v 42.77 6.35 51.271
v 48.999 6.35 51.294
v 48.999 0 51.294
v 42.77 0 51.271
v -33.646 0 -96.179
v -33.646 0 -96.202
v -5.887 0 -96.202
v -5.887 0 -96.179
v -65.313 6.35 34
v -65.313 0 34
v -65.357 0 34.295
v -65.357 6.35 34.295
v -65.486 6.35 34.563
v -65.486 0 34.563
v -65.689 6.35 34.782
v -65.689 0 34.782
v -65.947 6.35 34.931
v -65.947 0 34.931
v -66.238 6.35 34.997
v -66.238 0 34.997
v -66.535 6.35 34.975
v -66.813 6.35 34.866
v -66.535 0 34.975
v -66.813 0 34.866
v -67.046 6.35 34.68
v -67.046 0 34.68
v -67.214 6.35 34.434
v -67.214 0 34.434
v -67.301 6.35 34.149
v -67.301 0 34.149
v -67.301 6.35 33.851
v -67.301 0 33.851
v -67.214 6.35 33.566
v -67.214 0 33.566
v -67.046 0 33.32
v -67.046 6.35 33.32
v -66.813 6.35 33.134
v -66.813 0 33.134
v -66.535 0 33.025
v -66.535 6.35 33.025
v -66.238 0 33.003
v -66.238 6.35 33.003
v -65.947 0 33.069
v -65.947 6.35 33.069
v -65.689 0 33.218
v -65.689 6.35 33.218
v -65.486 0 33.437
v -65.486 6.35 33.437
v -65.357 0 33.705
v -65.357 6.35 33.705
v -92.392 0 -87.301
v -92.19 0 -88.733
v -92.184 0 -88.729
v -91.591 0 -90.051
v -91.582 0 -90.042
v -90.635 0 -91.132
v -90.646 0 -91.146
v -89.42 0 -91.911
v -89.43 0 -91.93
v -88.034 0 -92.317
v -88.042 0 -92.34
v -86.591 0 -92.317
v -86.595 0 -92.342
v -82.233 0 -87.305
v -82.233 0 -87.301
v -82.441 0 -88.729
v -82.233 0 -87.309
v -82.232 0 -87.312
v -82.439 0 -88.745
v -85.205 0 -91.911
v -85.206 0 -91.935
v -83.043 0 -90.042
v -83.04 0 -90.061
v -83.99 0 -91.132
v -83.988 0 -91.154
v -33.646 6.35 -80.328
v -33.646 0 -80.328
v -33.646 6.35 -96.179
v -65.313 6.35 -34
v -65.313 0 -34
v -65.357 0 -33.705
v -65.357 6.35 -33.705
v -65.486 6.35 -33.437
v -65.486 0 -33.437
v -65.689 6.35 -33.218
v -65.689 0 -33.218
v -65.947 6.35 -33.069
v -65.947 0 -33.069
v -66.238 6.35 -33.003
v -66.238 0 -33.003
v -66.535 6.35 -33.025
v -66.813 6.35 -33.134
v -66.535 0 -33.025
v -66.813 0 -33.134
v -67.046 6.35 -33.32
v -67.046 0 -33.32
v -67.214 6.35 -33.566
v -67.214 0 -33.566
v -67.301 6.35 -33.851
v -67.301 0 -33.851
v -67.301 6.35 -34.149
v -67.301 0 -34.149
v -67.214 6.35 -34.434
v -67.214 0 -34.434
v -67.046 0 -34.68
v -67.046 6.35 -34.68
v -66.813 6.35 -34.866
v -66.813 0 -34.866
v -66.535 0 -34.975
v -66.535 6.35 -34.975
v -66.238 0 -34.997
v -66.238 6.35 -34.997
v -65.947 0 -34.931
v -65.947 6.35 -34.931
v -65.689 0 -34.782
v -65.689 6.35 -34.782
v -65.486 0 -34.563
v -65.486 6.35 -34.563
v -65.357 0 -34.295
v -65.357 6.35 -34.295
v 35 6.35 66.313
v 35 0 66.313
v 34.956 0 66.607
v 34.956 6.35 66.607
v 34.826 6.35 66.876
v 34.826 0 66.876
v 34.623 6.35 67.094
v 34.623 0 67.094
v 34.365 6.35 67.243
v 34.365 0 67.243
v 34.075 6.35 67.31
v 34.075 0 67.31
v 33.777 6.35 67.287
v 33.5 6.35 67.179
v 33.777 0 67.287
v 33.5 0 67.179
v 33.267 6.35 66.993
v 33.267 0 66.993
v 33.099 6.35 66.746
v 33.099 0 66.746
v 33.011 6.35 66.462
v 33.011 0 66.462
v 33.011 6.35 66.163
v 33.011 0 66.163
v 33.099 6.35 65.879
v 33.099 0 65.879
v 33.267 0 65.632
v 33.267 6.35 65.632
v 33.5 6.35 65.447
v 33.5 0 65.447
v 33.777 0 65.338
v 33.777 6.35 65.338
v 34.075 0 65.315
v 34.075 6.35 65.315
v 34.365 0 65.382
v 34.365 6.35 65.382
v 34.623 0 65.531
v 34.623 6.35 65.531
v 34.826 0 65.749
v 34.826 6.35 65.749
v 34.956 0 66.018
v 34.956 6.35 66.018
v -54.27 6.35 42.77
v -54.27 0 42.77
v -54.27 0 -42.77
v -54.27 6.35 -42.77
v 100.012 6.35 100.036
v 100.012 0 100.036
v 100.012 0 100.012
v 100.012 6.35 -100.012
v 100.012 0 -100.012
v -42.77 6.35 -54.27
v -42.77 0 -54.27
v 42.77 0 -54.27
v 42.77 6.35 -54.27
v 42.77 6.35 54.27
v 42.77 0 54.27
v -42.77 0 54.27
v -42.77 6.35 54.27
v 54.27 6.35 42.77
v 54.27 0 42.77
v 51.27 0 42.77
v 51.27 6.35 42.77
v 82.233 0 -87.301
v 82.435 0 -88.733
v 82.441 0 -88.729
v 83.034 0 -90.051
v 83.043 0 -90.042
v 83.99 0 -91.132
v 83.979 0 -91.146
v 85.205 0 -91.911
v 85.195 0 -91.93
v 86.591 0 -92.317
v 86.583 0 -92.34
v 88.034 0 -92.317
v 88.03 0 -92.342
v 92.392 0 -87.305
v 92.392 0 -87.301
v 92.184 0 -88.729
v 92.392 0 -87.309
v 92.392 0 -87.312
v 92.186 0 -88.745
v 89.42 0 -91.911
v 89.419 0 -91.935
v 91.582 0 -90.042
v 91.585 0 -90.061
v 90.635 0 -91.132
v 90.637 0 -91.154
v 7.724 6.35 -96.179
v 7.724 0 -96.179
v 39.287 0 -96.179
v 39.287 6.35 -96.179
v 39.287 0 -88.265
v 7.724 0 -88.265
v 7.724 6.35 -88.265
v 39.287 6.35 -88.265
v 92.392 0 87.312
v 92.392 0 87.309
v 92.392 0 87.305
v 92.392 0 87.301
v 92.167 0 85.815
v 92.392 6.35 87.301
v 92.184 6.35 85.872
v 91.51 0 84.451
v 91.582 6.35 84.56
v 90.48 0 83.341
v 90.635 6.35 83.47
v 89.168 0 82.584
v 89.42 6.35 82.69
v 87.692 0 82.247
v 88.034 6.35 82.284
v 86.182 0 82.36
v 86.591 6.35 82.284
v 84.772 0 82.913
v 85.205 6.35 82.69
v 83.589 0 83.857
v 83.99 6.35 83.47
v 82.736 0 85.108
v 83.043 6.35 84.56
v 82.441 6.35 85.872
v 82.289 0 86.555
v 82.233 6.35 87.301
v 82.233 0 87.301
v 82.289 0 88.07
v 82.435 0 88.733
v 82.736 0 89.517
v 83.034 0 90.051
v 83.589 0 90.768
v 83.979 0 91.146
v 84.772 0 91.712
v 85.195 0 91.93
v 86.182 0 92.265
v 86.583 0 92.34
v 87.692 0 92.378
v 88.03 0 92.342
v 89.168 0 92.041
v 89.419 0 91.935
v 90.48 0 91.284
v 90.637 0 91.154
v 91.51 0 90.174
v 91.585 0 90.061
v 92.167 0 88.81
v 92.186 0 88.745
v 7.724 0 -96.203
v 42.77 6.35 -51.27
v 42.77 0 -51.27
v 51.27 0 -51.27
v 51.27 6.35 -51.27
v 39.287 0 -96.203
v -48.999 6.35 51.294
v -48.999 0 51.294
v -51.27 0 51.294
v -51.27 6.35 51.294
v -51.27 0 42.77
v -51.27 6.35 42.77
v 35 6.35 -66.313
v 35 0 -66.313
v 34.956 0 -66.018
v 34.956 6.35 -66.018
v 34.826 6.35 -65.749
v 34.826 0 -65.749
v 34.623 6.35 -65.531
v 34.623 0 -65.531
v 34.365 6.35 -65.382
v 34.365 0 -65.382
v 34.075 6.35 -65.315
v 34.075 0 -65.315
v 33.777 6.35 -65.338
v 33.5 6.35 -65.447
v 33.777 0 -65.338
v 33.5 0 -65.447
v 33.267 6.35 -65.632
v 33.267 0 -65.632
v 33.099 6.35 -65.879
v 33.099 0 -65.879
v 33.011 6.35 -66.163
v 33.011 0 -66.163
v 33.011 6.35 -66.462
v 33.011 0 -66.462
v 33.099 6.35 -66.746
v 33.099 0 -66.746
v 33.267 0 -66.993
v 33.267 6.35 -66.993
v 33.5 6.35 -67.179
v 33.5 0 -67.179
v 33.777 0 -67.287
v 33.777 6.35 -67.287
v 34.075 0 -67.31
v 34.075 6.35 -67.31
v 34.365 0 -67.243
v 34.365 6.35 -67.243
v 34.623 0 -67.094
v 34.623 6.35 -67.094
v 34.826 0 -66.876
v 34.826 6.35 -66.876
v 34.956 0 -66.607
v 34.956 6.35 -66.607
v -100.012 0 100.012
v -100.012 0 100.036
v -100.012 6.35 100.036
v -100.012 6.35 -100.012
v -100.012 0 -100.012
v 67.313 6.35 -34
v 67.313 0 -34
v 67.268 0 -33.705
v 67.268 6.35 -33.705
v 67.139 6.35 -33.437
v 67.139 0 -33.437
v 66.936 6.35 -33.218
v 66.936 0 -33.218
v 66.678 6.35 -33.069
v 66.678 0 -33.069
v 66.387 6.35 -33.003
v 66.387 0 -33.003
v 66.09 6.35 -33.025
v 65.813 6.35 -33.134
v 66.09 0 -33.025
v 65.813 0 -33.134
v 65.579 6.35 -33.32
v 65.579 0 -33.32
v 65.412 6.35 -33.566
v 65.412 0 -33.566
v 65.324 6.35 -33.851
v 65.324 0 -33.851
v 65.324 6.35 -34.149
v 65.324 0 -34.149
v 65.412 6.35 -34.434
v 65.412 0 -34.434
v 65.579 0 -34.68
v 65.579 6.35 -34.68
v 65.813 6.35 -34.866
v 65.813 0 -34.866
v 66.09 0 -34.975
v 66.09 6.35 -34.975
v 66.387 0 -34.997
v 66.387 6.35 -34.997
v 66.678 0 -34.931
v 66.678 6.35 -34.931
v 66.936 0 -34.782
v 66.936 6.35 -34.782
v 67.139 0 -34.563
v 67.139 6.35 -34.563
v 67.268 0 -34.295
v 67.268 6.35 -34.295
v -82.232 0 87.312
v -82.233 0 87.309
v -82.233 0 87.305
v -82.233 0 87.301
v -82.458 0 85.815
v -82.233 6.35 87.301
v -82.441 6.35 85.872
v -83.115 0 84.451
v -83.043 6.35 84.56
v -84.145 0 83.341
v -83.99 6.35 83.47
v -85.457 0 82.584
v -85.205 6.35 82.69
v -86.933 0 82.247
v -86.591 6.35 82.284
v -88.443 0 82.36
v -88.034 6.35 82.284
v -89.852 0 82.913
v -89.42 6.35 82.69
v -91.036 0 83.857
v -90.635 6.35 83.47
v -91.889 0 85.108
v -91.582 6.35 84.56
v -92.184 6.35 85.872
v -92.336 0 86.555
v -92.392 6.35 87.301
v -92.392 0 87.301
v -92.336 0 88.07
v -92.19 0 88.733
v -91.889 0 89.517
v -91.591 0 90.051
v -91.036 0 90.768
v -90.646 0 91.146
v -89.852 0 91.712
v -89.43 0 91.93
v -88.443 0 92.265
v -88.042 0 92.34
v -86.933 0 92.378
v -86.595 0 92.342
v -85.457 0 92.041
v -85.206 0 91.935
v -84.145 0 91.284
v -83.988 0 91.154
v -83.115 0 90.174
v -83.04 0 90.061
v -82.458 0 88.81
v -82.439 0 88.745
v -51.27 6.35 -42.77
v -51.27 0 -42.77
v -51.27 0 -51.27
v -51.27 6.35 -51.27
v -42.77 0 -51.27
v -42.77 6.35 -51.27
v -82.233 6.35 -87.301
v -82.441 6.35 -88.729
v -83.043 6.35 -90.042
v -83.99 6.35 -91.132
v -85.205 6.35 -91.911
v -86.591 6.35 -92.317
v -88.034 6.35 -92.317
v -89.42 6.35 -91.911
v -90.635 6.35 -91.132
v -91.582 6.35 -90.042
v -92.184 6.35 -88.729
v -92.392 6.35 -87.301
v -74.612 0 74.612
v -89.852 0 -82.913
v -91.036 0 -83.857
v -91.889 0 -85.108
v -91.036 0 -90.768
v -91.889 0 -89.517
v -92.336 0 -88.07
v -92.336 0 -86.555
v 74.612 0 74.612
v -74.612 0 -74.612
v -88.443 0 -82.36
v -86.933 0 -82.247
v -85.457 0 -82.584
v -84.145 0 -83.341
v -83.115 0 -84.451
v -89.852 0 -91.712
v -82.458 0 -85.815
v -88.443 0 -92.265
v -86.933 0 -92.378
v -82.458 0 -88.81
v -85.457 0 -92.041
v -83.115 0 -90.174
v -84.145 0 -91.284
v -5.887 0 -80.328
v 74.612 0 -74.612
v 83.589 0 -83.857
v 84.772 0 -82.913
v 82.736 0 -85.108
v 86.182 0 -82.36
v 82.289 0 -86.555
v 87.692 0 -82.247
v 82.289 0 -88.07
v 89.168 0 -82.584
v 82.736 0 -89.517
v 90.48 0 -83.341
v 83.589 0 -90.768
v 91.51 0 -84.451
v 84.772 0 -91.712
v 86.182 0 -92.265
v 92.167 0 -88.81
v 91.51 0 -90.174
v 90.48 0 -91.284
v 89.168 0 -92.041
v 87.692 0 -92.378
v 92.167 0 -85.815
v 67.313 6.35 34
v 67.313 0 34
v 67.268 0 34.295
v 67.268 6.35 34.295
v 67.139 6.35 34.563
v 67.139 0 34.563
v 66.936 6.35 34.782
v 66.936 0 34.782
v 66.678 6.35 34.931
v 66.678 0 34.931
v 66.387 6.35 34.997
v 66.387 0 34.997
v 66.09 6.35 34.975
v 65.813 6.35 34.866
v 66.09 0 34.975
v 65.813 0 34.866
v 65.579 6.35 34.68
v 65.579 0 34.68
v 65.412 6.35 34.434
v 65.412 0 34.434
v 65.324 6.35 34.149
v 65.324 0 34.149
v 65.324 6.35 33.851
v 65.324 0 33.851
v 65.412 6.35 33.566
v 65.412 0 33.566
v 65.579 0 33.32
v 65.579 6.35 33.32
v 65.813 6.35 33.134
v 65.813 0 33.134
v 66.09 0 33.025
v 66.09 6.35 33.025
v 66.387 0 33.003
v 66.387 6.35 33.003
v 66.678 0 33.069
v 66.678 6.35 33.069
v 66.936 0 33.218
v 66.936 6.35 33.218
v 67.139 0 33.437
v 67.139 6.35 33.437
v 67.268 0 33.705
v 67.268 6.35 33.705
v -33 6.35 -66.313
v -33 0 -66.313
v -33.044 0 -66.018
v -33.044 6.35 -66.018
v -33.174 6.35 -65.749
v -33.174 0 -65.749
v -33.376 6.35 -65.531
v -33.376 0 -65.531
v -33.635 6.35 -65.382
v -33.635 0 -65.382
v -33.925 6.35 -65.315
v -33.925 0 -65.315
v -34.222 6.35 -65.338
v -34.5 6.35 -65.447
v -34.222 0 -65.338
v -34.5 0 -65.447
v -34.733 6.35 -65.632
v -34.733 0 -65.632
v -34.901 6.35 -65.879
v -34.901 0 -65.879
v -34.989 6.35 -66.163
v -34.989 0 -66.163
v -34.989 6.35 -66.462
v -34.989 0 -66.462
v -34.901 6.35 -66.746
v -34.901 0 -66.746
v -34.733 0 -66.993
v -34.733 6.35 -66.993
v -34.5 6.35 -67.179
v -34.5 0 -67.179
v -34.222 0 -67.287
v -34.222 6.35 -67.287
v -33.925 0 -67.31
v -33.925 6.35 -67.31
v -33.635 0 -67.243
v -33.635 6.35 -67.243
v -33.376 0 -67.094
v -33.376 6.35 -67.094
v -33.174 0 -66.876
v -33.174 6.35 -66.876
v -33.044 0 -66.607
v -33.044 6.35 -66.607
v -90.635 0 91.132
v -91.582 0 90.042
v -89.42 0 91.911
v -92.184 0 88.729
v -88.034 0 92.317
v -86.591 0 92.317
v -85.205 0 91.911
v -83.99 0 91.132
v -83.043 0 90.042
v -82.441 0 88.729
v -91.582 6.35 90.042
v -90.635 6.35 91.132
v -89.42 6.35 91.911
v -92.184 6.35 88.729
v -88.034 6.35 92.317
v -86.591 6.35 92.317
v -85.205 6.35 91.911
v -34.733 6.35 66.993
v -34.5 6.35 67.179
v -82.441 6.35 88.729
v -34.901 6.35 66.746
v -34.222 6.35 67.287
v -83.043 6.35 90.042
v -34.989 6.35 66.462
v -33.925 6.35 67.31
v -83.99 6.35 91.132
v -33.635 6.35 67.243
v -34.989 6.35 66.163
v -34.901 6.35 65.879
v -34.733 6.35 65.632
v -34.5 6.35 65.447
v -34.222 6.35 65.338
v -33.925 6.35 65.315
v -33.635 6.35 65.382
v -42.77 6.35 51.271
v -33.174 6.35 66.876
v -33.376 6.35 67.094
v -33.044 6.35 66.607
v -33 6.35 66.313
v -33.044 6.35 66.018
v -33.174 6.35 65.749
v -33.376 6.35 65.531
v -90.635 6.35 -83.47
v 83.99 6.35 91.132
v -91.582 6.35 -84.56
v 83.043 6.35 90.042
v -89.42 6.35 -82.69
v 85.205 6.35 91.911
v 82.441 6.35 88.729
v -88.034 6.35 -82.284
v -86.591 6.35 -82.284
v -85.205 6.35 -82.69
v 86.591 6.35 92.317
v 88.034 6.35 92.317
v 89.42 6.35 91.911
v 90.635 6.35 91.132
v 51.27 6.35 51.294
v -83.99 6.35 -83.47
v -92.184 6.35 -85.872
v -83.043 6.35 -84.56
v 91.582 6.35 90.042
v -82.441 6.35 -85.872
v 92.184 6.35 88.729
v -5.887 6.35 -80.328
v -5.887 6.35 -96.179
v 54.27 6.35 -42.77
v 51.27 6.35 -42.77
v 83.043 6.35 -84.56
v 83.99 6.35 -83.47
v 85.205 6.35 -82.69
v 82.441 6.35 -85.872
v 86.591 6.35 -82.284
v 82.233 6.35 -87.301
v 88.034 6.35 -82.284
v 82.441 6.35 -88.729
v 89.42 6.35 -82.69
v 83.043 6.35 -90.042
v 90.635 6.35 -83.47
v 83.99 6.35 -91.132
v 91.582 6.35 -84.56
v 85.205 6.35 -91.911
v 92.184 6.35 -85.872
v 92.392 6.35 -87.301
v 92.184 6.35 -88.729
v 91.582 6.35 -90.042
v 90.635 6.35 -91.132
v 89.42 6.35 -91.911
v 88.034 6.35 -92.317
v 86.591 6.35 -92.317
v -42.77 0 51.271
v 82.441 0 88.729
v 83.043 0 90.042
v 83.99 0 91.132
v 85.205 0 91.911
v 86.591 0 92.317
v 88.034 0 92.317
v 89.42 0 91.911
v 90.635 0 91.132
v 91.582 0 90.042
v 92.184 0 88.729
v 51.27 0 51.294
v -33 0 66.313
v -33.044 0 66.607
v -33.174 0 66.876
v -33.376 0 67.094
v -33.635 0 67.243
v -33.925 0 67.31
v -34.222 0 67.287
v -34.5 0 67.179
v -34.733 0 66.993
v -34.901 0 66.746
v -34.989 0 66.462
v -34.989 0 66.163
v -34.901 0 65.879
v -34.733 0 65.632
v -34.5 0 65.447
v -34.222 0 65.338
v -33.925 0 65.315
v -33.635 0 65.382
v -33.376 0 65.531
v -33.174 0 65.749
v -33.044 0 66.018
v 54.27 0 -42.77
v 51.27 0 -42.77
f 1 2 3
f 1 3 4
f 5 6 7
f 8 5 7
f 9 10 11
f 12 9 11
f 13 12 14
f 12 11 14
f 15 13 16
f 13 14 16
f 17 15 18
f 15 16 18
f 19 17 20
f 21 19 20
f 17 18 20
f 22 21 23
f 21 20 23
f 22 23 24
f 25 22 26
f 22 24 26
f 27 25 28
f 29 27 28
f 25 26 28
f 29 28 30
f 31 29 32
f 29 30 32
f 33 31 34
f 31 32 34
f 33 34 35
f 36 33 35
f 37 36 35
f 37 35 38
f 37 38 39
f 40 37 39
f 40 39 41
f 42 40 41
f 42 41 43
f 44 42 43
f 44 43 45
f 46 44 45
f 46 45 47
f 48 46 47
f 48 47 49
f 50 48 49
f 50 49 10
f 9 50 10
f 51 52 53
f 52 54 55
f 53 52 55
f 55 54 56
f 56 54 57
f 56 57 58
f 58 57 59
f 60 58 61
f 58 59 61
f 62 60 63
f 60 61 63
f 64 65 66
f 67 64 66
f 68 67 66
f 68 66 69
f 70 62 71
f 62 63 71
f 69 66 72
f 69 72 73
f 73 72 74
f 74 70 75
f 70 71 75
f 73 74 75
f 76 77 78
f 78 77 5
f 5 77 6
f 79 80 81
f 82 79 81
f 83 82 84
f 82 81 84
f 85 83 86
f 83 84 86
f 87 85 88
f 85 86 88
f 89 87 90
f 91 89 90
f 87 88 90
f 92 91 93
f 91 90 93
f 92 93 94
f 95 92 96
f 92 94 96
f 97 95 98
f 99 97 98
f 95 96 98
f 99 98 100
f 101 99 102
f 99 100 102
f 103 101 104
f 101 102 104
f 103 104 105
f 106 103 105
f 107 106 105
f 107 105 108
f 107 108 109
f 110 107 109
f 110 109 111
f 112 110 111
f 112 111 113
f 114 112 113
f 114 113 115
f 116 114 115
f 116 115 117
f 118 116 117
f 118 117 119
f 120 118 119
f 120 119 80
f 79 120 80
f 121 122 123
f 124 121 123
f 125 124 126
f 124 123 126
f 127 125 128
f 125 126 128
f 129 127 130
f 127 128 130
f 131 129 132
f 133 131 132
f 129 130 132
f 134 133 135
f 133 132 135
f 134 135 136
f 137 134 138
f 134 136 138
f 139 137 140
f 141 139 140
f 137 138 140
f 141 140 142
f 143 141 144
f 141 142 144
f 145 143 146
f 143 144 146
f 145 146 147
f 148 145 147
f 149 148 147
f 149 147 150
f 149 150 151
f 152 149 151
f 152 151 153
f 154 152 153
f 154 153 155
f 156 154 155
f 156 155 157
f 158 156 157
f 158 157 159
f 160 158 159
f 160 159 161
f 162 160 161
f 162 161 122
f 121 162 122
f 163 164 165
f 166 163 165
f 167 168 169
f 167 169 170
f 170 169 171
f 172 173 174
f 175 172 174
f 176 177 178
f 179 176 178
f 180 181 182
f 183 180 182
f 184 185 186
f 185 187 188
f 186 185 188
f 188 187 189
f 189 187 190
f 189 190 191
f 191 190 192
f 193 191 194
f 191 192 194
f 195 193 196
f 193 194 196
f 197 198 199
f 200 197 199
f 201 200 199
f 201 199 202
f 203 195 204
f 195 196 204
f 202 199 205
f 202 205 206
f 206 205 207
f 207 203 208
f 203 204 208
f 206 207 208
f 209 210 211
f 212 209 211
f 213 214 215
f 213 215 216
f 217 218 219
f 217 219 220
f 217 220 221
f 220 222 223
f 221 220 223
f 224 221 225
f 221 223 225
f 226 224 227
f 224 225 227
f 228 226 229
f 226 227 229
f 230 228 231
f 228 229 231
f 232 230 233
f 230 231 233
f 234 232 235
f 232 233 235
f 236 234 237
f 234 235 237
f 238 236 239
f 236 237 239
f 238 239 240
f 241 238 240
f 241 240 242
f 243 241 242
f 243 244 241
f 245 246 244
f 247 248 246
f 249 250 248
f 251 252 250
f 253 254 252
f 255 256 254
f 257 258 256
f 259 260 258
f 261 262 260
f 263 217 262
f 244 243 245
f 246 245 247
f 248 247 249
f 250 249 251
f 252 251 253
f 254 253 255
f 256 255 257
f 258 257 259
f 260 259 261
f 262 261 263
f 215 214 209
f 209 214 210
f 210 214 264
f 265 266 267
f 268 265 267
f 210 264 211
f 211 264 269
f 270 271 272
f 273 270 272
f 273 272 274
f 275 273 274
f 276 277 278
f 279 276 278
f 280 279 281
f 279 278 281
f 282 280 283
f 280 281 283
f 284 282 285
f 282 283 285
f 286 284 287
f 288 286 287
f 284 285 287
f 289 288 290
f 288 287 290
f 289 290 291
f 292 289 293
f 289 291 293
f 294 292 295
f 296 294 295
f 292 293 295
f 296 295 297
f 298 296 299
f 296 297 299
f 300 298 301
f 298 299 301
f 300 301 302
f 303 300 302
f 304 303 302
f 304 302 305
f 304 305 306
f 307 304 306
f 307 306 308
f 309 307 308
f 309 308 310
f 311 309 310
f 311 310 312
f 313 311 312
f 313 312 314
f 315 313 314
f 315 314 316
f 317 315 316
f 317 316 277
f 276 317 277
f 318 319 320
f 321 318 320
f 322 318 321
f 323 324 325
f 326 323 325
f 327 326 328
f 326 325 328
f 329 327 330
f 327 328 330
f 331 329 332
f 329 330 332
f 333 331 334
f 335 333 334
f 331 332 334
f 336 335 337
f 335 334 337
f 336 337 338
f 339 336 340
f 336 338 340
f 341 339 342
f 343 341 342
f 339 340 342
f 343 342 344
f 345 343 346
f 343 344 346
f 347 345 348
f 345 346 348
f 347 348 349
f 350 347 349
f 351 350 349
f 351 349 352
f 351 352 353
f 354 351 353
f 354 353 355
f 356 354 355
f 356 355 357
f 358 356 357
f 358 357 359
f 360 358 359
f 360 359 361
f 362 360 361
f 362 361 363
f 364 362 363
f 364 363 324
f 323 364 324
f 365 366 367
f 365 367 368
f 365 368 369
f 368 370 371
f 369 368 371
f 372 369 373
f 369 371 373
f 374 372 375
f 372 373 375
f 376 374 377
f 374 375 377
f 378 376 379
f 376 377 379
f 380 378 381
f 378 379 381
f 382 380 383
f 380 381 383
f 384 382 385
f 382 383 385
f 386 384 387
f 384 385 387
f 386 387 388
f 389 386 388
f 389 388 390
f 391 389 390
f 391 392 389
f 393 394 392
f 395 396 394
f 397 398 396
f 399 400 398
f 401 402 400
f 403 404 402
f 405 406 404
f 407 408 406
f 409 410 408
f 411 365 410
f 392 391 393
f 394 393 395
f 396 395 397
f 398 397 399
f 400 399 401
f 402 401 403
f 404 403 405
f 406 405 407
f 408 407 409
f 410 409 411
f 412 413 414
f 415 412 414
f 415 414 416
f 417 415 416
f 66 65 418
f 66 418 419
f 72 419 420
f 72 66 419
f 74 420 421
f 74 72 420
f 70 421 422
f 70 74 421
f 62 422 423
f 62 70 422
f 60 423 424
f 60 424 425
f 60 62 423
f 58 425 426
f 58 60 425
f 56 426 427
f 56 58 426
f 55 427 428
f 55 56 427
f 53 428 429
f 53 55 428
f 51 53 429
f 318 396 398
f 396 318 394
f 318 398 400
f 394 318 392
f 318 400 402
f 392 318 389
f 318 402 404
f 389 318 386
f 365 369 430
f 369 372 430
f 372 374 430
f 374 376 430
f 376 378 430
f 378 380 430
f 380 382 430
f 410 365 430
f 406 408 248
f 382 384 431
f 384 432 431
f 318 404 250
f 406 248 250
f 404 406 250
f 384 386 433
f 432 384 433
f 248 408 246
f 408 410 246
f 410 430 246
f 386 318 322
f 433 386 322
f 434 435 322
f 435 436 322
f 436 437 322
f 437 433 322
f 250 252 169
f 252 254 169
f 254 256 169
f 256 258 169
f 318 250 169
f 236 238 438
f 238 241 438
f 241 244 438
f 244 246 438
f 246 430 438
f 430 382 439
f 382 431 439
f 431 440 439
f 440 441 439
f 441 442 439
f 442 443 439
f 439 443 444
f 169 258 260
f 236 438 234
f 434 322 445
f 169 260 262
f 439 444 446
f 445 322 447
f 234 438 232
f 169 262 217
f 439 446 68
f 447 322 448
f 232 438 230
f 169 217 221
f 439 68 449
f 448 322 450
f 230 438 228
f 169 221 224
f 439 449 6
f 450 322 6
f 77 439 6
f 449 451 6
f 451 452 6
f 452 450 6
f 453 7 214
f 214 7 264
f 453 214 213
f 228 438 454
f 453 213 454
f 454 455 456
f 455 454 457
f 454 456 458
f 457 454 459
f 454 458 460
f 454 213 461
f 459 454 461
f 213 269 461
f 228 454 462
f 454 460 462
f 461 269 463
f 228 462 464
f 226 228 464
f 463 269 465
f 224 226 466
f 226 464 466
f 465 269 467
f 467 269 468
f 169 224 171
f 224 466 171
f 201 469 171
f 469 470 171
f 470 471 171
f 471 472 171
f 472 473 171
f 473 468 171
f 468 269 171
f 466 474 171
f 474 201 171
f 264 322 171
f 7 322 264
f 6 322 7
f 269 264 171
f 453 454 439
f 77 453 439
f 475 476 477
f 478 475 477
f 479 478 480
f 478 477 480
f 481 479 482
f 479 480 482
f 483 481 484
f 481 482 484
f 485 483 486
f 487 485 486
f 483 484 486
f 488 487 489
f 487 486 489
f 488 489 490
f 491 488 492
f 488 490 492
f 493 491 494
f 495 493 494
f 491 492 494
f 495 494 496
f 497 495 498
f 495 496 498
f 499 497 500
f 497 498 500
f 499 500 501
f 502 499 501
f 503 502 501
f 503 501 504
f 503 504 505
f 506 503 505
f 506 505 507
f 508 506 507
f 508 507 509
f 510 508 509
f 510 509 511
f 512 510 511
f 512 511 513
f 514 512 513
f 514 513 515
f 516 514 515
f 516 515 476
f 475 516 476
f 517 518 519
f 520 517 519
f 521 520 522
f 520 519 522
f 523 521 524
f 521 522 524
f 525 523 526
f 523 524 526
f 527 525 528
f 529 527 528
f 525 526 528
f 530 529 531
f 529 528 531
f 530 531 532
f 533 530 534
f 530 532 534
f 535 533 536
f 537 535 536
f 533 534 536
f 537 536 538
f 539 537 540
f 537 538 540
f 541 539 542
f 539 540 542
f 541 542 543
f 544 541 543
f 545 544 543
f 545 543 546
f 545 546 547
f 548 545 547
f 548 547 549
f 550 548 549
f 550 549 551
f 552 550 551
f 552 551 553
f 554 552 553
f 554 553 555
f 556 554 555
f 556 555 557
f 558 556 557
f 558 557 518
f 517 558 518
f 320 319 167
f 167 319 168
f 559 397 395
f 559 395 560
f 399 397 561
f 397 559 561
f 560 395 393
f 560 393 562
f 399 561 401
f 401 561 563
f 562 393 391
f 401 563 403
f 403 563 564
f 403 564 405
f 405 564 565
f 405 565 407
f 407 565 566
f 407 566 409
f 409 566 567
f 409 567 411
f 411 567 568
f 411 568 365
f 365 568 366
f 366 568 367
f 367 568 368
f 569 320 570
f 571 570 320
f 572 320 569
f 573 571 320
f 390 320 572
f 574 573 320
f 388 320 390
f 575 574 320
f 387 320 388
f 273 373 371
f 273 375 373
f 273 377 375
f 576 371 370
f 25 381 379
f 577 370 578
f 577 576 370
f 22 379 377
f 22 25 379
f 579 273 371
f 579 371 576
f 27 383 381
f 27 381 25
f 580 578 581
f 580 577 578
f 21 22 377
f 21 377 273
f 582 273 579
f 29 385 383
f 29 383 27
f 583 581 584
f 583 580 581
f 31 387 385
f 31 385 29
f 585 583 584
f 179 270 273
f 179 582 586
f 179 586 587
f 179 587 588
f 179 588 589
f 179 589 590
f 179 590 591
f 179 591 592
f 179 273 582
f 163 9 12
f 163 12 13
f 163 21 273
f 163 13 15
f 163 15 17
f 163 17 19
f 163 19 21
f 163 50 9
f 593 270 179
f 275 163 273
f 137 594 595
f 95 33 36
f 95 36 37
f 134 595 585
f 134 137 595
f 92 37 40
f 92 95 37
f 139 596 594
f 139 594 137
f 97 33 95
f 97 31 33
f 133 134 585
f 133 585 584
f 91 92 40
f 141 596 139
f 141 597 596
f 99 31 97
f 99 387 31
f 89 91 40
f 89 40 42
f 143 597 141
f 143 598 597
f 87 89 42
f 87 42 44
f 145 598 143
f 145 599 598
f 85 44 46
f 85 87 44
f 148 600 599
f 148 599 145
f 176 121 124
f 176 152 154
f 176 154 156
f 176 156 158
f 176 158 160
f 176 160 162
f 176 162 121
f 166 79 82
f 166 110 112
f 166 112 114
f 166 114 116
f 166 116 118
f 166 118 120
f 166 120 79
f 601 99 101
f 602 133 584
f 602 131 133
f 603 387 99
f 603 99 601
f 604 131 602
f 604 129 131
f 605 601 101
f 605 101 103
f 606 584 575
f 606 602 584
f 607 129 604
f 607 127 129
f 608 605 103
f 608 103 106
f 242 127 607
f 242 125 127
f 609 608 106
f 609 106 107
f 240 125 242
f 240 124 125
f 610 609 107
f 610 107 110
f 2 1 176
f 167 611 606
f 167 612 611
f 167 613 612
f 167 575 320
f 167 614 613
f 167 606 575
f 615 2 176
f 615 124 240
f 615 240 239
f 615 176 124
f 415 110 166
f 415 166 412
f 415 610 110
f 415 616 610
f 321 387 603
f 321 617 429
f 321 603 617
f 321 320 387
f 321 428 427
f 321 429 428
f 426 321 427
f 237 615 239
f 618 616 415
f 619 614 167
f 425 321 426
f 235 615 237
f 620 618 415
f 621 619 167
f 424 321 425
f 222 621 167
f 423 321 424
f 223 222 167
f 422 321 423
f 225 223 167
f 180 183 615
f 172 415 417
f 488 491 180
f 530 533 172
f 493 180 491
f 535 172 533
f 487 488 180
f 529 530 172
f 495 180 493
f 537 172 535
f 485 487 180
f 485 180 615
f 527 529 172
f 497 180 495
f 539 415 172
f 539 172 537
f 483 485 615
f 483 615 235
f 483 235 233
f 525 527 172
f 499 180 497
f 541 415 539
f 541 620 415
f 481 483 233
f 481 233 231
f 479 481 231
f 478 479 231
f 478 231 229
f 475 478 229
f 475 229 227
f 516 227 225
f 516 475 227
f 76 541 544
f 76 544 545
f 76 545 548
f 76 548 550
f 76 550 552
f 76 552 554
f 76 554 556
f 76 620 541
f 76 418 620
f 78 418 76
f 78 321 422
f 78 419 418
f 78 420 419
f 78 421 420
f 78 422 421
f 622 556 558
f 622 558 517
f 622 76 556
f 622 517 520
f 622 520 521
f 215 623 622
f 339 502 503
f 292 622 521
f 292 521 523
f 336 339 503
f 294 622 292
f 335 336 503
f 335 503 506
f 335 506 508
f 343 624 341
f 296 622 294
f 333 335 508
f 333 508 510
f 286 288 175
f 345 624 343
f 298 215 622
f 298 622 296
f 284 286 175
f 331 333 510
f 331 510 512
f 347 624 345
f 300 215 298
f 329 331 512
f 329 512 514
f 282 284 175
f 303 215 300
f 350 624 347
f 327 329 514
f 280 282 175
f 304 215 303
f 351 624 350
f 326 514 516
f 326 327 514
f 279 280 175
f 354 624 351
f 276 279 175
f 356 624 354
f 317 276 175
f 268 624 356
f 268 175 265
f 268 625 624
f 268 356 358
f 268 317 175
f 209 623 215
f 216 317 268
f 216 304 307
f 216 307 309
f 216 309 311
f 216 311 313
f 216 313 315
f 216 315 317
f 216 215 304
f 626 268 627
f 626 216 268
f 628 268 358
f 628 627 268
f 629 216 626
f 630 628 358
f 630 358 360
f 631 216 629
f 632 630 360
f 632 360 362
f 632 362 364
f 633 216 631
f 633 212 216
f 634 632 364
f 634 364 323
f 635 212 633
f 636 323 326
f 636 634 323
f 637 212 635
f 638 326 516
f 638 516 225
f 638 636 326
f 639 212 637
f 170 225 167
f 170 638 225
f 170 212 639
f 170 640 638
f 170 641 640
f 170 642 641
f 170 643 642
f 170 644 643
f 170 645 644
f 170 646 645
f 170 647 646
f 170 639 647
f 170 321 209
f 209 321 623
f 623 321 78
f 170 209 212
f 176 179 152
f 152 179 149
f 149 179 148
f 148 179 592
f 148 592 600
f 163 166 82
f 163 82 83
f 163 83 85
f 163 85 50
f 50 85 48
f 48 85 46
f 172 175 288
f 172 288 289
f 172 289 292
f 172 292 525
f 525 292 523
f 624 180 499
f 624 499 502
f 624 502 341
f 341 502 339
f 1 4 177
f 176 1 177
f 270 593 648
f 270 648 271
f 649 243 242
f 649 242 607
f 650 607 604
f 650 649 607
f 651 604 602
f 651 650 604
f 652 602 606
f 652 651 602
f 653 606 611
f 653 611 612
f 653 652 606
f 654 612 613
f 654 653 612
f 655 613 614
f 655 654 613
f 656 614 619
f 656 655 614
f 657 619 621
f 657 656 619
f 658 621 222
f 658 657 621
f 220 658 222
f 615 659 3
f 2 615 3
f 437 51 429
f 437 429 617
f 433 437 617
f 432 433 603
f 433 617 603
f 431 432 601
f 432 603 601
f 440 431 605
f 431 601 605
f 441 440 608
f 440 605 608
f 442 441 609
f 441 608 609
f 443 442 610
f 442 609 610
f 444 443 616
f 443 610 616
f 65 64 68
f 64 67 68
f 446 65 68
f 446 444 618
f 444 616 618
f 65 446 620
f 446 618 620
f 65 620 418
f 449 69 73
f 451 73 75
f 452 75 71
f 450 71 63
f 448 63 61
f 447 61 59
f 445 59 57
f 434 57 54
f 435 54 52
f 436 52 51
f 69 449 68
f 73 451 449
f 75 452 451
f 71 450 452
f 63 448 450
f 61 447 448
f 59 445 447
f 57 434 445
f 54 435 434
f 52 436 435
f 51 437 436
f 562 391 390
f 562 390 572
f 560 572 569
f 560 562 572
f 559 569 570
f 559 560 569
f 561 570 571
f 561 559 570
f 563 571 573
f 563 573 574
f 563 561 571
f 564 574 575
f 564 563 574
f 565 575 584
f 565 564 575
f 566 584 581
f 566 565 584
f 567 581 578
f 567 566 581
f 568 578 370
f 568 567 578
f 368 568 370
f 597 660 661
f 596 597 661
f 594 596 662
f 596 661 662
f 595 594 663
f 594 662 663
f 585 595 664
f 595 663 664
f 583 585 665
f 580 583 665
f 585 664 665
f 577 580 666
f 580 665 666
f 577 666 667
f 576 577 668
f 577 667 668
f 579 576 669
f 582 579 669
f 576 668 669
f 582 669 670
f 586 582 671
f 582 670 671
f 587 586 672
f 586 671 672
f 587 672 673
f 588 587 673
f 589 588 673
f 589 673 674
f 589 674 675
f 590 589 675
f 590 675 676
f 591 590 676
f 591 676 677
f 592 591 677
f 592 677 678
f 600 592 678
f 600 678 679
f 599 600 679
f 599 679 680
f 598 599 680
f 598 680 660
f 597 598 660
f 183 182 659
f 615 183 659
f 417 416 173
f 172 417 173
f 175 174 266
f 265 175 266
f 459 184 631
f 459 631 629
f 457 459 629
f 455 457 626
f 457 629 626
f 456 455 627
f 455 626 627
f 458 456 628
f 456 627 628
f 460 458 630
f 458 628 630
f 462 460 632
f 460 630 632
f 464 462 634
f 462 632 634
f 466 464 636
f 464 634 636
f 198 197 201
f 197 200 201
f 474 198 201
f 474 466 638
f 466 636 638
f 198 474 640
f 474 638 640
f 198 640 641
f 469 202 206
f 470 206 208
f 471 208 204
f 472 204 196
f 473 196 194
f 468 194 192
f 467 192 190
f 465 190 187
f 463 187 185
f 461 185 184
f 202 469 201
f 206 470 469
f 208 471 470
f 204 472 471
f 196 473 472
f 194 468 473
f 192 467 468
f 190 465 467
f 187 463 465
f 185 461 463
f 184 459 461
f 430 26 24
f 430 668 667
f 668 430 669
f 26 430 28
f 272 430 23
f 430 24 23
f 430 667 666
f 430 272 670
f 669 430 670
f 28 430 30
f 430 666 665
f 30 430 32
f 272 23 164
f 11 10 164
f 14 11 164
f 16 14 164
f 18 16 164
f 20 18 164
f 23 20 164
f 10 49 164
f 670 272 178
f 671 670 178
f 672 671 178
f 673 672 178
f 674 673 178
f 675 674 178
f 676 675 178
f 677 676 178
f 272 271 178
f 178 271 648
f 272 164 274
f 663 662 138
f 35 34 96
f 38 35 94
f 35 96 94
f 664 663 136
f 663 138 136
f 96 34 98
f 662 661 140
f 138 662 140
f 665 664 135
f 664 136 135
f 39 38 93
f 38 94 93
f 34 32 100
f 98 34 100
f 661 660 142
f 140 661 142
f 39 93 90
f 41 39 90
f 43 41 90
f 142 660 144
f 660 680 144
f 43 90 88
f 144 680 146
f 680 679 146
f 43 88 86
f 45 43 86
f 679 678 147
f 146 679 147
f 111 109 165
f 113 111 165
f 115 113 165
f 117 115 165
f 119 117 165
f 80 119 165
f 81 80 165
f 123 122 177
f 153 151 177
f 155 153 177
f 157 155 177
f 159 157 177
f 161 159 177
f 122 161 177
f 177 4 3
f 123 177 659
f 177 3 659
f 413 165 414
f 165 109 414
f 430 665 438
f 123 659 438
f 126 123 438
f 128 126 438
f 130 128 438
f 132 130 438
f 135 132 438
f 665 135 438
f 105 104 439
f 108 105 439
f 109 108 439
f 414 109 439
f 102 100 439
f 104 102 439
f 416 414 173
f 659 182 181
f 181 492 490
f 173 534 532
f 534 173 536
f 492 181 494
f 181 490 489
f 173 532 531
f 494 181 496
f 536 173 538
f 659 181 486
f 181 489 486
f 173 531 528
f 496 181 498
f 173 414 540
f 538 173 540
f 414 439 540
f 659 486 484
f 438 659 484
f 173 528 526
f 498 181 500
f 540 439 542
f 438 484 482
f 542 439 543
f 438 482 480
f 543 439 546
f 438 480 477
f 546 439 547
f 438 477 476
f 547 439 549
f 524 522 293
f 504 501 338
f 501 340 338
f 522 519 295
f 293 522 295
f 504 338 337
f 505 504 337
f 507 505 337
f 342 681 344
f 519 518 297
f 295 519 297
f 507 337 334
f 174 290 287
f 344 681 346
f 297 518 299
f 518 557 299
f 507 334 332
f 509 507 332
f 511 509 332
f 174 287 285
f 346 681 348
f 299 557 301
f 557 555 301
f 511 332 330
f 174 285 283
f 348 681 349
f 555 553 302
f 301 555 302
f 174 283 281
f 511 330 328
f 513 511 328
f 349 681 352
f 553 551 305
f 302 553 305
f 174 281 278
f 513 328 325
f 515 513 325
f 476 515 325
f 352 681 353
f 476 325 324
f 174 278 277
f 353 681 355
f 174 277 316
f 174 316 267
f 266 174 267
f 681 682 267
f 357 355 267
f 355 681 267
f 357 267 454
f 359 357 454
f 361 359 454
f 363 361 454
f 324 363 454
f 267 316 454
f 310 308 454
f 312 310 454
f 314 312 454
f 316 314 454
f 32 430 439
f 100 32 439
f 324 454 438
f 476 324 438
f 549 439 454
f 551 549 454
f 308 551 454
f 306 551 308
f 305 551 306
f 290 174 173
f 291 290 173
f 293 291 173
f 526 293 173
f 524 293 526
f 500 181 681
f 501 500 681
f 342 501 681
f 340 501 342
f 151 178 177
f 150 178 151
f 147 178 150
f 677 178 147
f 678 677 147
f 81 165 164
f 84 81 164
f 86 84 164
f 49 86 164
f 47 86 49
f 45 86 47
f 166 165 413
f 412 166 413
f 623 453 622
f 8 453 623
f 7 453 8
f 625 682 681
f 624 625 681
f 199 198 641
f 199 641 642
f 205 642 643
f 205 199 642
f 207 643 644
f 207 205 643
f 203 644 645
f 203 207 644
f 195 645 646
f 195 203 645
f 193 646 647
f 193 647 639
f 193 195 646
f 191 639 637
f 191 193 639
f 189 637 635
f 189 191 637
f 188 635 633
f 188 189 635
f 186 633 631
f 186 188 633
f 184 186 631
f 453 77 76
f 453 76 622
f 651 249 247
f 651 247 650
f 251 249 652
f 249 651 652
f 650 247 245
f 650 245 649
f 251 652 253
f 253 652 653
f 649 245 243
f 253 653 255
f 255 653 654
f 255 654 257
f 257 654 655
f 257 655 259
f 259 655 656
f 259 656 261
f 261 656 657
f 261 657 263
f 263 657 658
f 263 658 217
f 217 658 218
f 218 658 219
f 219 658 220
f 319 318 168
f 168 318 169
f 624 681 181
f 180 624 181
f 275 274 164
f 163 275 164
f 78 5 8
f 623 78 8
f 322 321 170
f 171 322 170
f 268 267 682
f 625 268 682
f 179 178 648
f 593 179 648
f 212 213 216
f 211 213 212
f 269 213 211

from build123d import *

# Parameters (mm, degrees)
SKETCH1_W           = 200.025
SKETCH1_H           = 200.025
SKETCH1_R           = 5.08
SKETCH1_W_2         = 27.758924323
SKETCH1_H_2         = 15.850492031
SKETCH1_W_3         = 31.563171913
SKETCH1_H_3         = 7.913427648
BOSS_EXTRUDE1_DEPTH = 6.35
SKETCH2_W           = 200.025
SKETCH2_H           = 200.025
SKETCH2_R           = 5.08
SKETCH2_W_2         = 149.225
SKETCH2_H_2         = 149.225
SKETCH2_W_3         = 27.758924323
SKETCH2_H_3         = 15.874128766
SKETCH2_W_4         = 31.563171913
SKETCH2_H_4         = 7.937064383
BOSS_EXTRUDE2_DEPTH = 6.350254
SKETCH3_R           = 1.00000054
CUT_EXTRUDE1_DEPTH  = 23.622


with BuildPart() as part:
    # Sketch1 → Boss-Extrude1 (new body)
    with BuildSketch(Plane(origin=(0, 0, 0), x_dir=(1, 0, 0), z_dir=(0, 1, 0))):
        with Locations((0, -0.023636735)):
            Rectangle(SKETCH1_W, SKETCH1_H)
        with Locations((-87.3125, 87.288863265)):
            Circle(SKETCH1_R, mode=Mode.SUBTRACT)
        with Locations((87.3125, 87.288863265)):
            Circle(SKETCH1_R, mode=Mode.SUBTRACT)
        with Locations((-87.3125, -87.288863265)):
            Circle(SKETCH1_R, mode=Mode.SUBTRACT)
        with Locations((87.3125, -87.288863265)):
            Circle(SKETCH1_R, mode=Mode.SUBTRACT)
        Polygon((38.5, 54.27), (42.77, 54.27), (42.77, 51.27), (49, 51.27), (51.27, 51.27), (51.27, 49), (51.27, 42.77), (54.27, 42.77), (54.27, 38.5), (54.27, -38.5), (54.27, -42.77), (51.27, -42.77), (51.27, -49), (51.27, -51.293636735), (48.998814015, -51.293636735), (42.77, -51.270990058), (42.77, -54.27), (38.5, -54.27), (-38.5, -54.27), (-42.77, -54.27), (-42.77, -51.270990058), (-48.998814015, -51.293636735), (-51.27, -51.293636735), (-51.27, -49), (-51.27, -42.77), (-54.27, -42.77), (-54.27, -38.5), (-54.27, 38.5), (-54.27, 42.77), (-51.27, 42.77), (-51.27, 49), (-51.27, 51.27), (-49, 51.27), (-42.77, 51.27), (-42.77, 54.27), (-38.5, 54.27), align=None, mode=Mode.SUBTRACT)
        with Locations((-19.766444167, 88.253617249)):
            Rectangle(SKETCH1_W_2, SKETCH1_H_2, mode=Mode.SUBTRACT)
        with Locations((23.505506165, 92.222149441)):
            Rectangle(SKETCH1_W_3, SKETCH1_H_3, mode=Mode.SUBTRACT)
    extrude(amount=BOSS_EXTRUDE1_DEPTH)

    # Sketch2 → Boss-Extrude2 (add)
    with BuildSketch(Plane(origin=(0, 6.35, 0), x_dir=(1, 0, 0), z_dir=(0, 1, 0))):
        Rectangle(SKETCH2_W, SKETCH2_H)
        with Locations((-87.3125, 87.3125)):
            Circle(SKETCH2_R, mode=Mode.SUBTRACT)
        with Locations((87.3125, 87.3125)):
            Circle(SKETCH2_R, mode=Mode.SUBTRACT)
        with Locations((-87.3125, -87.3125)):
            Circle(SKETCH2_R, mode=Mode.SUBTRACT)
        with Locations((87.3125, -87.3125)):
            Circle(SKETCH2_R, mode=Mode.SUBTRACT)
        Rectangle(SKETCH2_W_2, SKETCH2_H_2, mode=Mode.SUBTRACT)
        with Locations((-19.766444167, 88.265435617)):
            Rectangle(SKETCH2_W_3, SKETCH2_H_3, mode=Mode.SUBTRACT)
        with Locations((23.505506165, 92.233967809)):
            Rectangle(SKETCH2_W_4, SKETCH2_H_4, mode=Mode.SUBTRACT)
    extrude(amount=-BOSS_EXTRUDE2_DEPTH)

    # Sketch3 → Cut-Extrude1 (cut)
    with BuildSketch(Plane.XZ):
        with Locations((-33.999932, -66.312542)):
            Circle(SKETCH3_R)
        with Locations((33.999932, -66.312542)):
            Circle(SKETCH3_R)
        with Locations((-66.312542, 33.999932)):
            Circle(SKETCH3_R)
        with Locations((-66.312542, -33.999932)):
            Circle(SKETCH3_R)
        with Locations((33.999932, 66.312542)):
            Circle(SKETCH3_R)
        with Locations((-33.999932, 66.312542)):
            Circle(SKETCH3_R)
        with Locations((66.312542, -33.999932)):
            Circle(SKETCH3_R)
        with Locations((66.312542, 33.999932)):
            Circle(SKETCH3_R)
    extrude(amount=-CUT_EXTRUDE1_DEPTH, mode=Mode.SUBTRACT)


solid = part.part
